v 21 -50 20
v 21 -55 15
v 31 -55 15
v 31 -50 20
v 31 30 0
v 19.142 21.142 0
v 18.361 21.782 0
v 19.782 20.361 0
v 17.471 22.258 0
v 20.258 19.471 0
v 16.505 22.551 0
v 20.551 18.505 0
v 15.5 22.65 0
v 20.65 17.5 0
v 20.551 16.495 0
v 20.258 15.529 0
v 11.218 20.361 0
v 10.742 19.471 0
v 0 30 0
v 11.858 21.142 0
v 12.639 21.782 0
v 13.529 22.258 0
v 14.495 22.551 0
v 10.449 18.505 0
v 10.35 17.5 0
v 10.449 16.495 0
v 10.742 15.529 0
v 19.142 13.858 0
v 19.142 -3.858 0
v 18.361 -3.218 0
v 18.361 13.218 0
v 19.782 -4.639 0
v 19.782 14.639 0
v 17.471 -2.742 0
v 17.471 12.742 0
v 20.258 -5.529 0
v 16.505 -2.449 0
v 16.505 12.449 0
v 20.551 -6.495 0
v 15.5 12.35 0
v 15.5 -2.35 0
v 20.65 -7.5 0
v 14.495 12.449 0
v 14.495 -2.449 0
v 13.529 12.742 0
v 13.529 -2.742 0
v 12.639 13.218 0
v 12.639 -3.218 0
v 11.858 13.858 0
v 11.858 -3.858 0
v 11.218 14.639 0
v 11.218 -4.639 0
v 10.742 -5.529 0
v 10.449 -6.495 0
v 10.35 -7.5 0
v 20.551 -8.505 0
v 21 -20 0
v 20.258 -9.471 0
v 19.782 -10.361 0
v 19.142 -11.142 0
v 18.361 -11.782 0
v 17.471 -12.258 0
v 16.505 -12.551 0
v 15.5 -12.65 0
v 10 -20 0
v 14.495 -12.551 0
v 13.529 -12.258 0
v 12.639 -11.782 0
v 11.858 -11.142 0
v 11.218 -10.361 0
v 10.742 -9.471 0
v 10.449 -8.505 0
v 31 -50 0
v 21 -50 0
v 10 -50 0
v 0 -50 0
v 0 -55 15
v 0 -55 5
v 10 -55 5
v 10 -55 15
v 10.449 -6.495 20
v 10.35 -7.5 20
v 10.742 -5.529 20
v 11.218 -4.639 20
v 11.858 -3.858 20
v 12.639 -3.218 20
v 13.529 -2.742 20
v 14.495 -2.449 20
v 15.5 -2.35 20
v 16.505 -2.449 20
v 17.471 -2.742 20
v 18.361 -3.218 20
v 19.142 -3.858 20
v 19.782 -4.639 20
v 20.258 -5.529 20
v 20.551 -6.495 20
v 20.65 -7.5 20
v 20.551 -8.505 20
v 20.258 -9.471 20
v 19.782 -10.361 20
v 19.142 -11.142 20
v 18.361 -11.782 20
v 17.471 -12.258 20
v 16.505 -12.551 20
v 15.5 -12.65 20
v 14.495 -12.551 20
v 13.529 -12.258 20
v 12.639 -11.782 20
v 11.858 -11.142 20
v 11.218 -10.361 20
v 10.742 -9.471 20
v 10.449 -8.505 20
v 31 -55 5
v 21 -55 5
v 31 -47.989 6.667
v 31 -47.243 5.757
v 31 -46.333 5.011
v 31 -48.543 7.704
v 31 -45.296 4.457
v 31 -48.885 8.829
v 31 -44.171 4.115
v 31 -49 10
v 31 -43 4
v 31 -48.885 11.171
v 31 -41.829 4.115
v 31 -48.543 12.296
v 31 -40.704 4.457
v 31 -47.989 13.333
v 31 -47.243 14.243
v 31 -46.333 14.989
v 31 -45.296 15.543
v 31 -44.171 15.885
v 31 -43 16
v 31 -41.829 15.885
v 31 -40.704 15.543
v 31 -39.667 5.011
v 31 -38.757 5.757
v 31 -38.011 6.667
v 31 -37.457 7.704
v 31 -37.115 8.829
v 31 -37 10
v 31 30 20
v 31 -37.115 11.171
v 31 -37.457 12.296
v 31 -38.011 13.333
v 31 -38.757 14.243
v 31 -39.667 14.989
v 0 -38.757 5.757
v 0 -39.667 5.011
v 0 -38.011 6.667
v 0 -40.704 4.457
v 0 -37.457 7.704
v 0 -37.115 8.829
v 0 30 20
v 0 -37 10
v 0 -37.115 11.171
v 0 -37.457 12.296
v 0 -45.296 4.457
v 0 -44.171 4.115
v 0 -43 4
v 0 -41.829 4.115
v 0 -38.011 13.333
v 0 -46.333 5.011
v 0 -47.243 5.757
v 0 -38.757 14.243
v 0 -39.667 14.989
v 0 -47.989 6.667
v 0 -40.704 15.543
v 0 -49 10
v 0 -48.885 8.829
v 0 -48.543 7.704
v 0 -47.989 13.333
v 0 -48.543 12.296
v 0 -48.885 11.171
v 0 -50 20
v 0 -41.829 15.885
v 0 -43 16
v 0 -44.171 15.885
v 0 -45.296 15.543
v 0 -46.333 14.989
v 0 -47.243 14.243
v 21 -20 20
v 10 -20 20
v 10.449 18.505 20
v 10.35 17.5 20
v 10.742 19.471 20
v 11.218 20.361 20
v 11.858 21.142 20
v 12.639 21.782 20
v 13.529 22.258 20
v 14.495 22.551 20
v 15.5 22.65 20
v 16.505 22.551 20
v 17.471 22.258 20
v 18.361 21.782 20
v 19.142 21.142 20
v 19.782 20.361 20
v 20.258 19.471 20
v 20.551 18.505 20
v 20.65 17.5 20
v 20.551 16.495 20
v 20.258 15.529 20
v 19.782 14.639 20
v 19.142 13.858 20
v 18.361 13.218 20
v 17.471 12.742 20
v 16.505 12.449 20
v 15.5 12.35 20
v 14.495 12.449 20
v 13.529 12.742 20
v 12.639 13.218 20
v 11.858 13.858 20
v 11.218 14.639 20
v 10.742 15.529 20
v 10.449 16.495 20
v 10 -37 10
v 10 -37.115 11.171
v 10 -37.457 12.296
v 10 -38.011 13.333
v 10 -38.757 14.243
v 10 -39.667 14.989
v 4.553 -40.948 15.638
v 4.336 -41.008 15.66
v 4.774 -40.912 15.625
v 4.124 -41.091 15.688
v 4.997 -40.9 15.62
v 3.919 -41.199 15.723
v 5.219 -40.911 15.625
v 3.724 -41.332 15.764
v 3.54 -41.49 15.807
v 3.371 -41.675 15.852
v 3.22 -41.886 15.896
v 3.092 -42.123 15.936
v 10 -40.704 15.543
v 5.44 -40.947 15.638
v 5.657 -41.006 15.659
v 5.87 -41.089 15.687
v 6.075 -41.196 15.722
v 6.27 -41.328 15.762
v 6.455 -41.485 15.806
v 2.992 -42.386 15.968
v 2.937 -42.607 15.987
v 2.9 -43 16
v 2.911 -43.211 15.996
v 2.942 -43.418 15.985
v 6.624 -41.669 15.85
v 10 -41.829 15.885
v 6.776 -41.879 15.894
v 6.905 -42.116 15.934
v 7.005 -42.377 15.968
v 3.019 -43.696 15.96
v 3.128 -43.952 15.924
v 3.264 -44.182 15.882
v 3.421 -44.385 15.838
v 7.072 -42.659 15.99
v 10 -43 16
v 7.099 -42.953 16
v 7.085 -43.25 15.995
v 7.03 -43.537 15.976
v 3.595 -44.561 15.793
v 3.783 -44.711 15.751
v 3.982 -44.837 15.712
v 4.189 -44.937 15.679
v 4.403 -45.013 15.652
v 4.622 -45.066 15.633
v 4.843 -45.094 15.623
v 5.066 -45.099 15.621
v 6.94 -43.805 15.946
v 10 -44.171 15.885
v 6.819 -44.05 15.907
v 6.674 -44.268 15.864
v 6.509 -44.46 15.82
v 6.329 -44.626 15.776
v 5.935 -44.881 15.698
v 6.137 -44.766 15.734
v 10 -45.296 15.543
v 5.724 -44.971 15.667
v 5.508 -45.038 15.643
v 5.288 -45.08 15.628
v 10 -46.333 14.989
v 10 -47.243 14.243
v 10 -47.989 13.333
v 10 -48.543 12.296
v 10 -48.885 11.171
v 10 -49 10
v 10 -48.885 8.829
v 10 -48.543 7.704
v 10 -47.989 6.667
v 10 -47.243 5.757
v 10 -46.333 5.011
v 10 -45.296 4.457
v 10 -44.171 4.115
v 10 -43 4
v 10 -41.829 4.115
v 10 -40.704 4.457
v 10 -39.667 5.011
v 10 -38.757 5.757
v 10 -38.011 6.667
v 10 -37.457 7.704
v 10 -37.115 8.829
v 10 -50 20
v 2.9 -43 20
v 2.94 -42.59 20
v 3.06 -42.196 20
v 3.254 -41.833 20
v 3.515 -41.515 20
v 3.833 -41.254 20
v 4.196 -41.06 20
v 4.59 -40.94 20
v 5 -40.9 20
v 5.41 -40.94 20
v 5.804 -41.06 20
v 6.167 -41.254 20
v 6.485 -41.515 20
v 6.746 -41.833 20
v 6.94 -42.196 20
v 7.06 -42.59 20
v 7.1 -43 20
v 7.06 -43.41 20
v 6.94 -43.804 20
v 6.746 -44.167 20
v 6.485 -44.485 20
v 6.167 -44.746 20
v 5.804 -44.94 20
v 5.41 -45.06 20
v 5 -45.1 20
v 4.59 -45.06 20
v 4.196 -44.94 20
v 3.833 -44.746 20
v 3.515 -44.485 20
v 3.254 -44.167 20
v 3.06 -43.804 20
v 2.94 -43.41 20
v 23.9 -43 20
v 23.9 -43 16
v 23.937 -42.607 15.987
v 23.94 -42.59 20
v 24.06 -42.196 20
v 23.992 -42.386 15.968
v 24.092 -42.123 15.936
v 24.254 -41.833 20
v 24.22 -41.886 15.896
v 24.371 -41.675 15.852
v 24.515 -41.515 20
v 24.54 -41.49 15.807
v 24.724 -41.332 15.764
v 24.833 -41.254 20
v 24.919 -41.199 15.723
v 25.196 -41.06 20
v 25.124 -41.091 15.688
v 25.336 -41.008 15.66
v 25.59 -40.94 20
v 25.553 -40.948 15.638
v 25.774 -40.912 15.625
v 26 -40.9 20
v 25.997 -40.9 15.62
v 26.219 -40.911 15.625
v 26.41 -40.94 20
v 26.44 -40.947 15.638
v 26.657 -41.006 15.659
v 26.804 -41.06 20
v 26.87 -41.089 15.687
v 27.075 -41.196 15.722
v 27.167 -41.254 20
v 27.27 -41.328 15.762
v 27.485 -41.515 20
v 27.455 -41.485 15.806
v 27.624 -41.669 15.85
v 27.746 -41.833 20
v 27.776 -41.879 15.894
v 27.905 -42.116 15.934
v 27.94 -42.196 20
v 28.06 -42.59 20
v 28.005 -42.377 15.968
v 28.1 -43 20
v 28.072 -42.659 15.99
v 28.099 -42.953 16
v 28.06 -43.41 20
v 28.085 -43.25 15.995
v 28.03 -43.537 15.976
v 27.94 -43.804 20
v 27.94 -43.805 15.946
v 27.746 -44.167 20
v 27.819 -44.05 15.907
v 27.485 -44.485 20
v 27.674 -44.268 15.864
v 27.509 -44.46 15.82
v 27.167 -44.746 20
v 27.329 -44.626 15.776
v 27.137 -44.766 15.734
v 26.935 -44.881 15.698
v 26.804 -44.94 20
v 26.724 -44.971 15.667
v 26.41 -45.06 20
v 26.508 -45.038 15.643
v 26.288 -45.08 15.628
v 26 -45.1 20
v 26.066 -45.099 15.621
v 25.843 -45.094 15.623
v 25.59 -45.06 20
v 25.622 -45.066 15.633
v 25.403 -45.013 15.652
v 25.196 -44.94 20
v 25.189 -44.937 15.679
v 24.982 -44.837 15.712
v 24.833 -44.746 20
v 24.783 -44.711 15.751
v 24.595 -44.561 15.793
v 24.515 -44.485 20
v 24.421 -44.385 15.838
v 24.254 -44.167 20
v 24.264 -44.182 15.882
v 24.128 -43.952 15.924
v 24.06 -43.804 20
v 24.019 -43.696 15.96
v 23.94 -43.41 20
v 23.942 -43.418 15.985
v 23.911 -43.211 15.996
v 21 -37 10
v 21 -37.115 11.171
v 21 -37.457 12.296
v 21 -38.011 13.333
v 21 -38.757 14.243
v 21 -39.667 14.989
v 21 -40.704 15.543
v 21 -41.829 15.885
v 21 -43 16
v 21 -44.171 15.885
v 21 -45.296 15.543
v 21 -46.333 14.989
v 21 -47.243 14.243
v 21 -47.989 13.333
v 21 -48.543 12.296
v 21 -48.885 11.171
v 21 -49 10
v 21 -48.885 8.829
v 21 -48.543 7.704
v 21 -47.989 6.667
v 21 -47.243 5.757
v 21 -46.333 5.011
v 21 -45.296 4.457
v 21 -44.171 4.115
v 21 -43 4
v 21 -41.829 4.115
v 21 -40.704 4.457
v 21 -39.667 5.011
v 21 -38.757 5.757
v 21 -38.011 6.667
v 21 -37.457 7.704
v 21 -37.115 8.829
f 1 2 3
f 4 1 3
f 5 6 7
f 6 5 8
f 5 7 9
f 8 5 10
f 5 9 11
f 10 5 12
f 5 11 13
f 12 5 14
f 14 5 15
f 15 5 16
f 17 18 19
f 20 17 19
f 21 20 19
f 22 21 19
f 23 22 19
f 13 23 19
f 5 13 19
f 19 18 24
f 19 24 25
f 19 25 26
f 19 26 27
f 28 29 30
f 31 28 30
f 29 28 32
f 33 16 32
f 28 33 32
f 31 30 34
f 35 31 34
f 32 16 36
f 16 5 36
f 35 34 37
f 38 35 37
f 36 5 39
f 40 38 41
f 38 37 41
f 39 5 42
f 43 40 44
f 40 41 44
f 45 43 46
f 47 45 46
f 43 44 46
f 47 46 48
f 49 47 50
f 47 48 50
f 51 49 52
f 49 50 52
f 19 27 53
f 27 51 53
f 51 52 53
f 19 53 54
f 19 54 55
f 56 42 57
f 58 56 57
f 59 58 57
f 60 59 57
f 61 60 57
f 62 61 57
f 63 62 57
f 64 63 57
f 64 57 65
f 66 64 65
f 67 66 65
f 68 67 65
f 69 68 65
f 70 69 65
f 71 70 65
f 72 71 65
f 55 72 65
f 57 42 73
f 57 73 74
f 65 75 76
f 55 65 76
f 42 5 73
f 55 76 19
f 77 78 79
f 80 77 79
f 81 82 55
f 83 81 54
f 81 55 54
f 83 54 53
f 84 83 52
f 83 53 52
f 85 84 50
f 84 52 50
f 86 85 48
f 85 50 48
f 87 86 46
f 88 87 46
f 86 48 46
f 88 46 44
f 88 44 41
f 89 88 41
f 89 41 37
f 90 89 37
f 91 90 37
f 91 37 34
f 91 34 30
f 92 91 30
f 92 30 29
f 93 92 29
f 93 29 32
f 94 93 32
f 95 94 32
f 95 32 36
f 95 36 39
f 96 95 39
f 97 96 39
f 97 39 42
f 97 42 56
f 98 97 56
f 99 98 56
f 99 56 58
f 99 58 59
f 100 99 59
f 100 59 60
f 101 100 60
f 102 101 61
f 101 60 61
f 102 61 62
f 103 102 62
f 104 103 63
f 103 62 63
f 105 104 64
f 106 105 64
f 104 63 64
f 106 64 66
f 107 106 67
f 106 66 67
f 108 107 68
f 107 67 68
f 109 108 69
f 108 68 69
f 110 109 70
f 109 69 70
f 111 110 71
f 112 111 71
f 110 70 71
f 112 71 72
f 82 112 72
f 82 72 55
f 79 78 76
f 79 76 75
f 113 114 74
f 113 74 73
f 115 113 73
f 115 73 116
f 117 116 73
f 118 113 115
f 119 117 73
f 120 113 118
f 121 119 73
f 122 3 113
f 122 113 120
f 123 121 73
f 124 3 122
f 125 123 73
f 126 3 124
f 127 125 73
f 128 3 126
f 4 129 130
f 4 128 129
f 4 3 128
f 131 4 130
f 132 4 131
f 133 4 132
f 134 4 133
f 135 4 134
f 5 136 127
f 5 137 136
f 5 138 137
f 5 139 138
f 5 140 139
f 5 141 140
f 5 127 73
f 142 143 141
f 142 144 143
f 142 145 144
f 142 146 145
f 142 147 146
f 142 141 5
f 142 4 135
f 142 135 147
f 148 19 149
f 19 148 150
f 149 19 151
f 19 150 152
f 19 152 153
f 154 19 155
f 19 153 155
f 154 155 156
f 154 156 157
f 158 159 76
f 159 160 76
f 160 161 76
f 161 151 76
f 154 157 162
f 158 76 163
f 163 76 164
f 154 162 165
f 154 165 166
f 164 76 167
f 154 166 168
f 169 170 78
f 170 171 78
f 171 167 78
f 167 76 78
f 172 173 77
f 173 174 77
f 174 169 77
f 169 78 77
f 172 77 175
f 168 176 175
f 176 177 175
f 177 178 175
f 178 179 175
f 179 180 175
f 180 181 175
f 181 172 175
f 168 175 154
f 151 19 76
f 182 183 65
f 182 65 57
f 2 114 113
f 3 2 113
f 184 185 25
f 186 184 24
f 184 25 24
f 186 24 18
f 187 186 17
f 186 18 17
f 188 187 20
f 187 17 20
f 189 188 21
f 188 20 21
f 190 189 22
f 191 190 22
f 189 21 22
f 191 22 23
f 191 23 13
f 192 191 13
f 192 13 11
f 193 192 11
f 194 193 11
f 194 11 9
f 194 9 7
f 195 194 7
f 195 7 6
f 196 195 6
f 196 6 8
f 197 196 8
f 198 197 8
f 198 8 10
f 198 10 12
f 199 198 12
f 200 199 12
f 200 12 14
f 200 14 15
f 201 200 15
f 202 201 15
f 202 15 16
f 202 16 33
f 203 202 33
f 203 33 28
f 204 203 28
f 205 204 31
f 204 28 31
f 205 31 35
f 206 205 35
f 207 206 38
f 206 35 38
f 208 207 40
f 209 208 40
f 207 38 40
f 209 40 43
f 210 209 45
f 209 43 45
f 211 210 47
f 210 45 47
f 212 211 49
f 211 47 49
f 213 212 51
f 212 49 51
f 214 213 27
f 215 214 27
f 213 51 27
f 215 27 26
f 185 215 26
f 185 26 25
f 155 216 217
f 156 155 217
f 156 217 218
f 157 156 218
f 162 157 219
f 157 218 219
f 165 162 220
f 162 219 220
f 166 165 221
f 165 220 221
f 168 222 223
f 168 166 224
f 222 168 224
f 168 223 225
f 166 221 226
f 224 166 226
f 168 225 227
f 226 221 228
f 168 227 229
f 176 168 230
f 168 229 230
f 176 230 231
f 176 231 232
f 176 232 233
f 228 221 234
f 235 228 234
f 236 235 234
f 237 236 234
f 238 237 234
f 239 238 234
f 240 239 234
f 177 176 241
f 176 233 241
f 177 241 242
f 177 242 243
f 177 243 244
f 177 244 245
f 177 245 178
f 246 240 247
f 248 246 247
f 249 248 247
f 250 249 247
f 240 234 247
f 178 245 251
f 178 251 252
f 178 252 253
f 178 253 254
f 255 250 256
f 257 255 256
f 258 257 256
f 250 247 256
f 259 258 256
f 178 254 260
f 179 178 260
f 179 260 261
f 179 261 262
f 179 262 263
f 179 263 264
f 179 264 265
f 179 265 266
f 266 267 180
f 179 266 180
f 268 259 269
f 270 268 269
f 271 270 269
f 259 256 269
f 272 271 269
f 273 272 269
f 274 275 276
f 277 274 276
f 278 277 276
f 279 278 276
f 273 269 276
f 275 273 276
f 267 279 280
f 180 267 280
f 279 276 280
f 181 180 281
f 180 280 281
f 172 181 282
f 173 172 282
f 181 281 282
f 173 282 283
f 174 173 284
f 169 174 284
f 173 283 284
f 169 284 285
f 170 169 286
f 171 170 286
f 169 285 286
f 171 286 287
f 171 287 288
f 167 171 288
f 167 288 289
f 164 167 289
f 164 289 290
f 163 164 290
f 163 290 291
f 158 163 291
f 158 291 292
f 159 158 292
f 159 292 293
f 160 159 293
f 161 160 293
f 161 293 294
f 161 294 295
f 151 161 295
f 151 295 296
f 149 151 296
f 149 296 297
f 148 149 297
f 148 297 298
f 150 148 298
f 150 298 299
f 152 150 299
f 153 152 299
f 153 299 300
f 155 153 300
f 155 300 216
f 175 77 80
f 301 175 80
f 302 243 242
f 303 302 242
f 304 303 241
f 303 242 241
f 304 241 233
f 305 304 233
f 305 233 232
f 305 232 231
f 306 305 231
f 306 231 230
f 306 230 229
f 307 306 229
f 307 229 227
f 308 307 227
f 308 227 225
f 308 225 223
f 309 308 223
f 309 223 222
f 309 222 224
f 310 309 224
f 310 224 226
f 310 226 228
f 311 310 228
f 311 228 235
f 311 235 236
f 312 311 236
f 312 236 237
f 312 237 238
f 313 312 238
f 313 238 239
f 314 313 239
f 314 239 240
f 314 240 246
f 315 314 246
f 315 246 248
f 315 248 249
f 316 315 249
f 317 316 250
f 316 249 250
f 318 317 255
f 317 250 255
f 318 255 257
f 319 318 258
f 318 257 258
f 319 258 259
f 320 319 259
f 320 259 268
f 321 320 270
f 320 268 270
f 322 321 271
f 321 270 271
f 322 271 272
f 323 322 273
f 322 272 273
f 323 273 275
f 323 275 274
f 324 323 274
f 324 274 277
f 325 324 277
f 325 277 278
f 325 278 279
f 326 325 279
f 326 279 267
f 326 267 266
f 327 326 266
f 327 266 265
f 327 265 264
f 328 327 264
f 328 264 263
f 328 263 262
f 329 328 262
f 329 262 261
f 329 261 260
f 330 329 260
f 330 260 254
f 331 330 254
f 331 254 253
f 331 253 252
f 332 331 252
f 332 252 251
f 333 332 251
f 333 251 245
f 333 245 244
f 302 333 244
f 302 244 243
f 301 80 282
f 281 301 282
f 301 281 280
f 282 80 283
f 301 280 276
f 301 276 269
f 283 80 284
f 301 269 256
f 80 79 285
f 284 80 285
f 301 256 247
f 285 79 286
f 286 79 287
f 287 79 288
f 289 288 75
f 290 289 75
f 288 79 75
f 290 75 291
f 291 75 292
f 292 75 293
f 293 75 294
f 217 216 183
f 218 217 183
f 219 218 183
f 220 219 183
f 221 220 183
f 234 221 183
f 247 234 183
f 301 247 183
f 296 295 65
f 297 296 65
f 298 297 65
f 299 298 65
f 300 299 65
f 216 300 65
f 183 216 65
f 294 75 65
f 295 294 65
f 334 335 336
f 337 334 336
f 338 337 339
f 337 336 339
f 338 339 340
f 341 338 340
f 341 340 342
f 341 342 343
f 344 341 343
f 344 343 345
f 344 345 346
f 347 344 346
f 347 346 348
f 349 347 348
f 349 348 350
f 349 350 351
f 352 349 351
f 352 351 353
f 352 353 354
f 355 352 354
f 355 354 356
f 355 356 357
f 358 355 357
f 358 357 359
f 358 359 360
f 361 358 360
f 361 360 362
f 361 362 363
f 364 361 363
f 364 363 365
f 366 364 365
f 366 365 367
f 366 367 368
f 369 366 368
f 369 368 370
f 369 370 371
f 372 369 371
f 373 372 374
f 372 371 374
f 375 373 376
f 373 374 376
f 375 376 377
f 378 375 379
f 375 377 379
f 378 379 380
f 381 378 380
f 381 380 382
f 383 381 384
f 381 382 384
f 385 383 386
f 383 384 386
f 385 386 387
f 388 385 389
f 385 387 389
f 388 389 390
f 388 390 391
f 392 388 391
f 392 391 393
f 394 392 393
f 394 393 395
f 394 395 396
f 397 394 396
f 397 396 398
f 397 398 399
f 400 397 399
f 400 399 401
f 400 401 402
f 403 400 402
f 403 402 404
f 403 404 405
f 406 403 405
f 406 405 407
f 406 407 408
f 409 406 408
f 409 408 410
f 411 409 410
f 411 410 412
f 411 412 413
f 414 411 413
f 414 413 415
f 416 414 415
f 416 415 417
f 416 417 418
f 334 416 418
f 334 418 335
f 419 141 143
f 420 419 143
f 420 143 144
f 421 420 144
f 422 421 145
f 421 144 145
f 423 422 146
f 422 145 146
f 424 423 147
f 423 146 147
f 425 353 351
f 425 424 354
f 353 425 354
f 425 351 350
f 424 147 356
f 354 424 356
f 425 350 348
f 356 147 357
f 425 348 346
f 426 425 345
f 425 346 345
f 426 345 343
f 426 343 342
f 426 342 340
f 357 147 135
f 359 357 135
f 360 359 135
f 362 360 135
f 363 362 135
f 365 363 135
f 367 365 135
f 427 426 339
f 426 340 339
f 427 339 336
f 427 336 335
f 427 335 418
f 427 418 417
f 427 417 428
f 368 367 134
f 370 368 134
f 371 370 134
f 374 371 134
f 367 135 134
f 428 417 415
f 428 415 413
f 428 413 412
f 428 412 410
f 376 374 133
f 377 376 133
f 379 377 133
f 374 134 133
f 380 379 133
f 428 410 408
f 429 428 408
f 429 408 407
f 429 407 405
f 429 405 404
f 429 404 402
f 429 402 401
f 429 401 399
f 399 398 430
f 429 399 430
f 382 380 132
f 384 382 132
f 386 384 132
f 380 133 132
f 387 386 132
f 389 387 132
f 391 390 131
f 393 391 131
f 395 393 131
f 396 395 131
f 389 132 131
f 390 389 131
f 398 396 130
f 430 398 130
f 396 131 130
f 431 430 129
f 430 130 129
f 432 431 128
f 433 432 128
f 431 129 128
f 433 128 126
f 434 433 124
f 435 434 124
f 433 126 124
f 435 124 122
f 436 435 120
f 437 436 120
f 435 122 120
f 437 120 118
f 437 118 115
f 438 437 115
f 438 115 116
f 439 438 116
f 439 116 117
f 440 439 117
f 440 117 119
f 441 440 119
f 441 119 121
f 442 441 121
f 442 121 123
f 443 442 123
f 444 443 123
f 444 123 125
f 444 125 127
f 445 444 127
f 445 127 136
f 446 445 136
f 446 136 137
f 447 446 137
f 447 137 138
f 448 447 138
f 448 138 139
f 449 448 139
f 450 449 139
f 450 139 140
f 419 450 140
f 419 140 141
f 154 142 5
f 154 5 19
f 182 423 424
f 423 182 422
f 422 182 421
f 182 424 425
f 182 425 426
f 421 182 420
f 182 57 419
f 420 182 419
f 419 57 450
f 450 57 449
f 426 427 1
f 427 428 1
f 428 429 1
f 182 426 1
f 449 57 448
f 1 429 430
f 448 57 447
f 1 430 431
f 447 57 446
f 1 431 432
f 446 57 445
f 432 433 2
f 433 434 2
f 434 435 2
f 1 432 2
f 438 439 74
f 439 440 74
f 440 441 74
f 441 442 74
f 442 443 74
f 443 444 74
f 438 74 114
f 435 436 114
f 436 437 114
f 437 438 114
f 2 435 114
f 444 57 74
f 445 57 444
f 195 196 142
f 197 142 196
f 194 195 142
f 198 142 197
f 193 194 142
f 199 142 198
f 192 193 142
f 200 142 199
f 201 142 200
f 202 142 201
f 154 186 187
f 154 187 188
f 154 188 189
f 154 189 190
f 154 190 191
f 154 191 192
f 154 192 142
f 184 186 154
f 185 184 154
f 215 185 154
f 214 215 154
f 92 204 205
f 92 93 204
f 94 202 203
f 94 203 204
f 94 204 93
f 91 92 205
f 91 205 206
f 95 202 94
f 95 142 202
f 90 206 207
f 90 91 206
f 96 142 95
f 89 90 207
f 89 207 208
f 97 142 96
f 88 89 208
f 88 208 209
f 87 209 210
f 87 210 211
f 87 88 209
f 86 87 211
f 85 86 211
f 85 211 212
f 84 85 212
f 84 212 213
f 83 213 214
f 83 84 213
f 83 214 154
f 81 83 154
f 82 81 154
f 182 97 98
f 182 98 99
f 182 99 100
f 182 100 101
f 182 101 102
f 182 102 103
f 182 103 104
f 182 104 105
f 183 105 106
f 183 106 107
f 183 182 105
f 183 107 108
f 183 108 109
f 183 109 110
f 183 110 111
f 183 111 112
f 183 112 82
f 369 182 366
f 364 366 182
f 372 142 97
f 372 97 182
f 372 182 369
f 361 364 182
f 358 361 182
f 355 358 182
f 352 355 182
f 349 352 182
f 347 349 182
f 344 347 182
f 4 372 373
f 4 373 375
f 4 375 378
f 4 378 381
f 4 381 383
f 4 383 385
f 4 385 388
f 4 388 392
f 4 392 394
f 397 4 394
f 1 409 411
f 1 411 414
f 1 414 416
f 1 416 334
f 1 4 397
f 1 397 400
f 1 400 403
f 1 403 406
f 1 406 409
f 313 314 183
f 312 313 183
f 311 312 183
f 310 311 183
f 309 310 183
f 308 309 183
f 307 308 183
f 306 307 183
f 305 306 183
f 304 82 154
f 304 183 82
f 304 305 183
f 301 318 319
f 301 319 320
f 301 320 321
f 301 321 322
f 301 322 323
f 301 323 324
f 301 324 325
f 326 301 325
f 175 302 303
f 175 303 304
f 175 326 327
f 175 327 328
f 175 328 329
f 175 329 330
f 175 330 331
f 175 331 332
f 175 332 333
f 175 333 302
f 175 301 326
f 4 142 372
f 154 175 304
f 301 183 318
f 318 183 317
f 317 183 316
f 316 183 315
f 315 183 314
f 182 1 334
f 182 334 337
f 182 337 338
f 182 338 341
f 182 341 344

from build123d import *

# Parameters (mm, degrees)
F1_DEPTH  = 20
F3_D      = 12
F5_D      = 4.2
F5_DEPTH  = 14.4
F5_TIP    = 1.2618073
F6_SIZE   = 5
F7_W      = 60
F7_H      = 20
F8_DEPTH  = 30
F10_D     = 10.3
F11_W     = 29
F11_H     = 50
F12_DEPTH = 20.001


with BuildPart() as f1:
    # F0 (on Top) → F1 (new body)
    with BuildSketch(Plane.XY):
        Polygon((60, 0), (0, 0), (0, -55), (10, -55), (10, -20), (21, -20), (21, -55), (31, -55), (31, -20), (60, -20), align=None)
    extrude(amount=F1_DEPTH)

    # F3 (through all)
    with Locations(Plane(origin=(0, 0, 0), x_dir=(0, -1, 0), z_dir=(-1, 0, 0))):
        with Locations((43, 10)):
            Hole(F3_D / 2)

    # F5
    with Locations(Plane.XY.offset(20)):
        with Locations((5, -43), (26, -43)):
            Hole(F5_D / 2, depth=F5_DEPTH)
            with Locations((0, 0, -(F5_DEPTH + F5_TIP / 2))):  # 118° drill point
                Cone(0, F5_D / 2, F5_TIP, mode=Mode.SUBTRACT)

    # F6
    f6_edges = [f1.edges().sort_by_distance(p)[0] for p in [
        (5, -55, 20),
        (26, -55, 20),
        (26, -55, 0),
        (5, -55, 0),
    ]]
    chamfer(f6_edges, length=F6_SIZE)

    # F7 (on face) → F8 (join)
    with BuildSketch(Plane(origin=(0, 0, 0), x_dir=(-1, 0, 0), z_dir=(0, 1, 0))):
        with Locations((-30, 10)):
            Rectangle(F7_W, F7_H)
    extrude(amount=F8_DEPTH)

    # F10 (through all)
    with Locations(Plane.XY.offset(20)):
        with Locations((15.5, 17.5), (15.5, -7.5)):
            Hole(F10_D / 2)

    # F11 (on face) → F12 (cut, through all)
    with BuildSketch(Plane.XY.offset(20)):
        with Locations((45.5, 5)):
            Rectangle(F11_W, F11_H)
    extrude(amount=-F12_DEPTH, mode=Mode.SUBTRACT)


solid = f1.part
